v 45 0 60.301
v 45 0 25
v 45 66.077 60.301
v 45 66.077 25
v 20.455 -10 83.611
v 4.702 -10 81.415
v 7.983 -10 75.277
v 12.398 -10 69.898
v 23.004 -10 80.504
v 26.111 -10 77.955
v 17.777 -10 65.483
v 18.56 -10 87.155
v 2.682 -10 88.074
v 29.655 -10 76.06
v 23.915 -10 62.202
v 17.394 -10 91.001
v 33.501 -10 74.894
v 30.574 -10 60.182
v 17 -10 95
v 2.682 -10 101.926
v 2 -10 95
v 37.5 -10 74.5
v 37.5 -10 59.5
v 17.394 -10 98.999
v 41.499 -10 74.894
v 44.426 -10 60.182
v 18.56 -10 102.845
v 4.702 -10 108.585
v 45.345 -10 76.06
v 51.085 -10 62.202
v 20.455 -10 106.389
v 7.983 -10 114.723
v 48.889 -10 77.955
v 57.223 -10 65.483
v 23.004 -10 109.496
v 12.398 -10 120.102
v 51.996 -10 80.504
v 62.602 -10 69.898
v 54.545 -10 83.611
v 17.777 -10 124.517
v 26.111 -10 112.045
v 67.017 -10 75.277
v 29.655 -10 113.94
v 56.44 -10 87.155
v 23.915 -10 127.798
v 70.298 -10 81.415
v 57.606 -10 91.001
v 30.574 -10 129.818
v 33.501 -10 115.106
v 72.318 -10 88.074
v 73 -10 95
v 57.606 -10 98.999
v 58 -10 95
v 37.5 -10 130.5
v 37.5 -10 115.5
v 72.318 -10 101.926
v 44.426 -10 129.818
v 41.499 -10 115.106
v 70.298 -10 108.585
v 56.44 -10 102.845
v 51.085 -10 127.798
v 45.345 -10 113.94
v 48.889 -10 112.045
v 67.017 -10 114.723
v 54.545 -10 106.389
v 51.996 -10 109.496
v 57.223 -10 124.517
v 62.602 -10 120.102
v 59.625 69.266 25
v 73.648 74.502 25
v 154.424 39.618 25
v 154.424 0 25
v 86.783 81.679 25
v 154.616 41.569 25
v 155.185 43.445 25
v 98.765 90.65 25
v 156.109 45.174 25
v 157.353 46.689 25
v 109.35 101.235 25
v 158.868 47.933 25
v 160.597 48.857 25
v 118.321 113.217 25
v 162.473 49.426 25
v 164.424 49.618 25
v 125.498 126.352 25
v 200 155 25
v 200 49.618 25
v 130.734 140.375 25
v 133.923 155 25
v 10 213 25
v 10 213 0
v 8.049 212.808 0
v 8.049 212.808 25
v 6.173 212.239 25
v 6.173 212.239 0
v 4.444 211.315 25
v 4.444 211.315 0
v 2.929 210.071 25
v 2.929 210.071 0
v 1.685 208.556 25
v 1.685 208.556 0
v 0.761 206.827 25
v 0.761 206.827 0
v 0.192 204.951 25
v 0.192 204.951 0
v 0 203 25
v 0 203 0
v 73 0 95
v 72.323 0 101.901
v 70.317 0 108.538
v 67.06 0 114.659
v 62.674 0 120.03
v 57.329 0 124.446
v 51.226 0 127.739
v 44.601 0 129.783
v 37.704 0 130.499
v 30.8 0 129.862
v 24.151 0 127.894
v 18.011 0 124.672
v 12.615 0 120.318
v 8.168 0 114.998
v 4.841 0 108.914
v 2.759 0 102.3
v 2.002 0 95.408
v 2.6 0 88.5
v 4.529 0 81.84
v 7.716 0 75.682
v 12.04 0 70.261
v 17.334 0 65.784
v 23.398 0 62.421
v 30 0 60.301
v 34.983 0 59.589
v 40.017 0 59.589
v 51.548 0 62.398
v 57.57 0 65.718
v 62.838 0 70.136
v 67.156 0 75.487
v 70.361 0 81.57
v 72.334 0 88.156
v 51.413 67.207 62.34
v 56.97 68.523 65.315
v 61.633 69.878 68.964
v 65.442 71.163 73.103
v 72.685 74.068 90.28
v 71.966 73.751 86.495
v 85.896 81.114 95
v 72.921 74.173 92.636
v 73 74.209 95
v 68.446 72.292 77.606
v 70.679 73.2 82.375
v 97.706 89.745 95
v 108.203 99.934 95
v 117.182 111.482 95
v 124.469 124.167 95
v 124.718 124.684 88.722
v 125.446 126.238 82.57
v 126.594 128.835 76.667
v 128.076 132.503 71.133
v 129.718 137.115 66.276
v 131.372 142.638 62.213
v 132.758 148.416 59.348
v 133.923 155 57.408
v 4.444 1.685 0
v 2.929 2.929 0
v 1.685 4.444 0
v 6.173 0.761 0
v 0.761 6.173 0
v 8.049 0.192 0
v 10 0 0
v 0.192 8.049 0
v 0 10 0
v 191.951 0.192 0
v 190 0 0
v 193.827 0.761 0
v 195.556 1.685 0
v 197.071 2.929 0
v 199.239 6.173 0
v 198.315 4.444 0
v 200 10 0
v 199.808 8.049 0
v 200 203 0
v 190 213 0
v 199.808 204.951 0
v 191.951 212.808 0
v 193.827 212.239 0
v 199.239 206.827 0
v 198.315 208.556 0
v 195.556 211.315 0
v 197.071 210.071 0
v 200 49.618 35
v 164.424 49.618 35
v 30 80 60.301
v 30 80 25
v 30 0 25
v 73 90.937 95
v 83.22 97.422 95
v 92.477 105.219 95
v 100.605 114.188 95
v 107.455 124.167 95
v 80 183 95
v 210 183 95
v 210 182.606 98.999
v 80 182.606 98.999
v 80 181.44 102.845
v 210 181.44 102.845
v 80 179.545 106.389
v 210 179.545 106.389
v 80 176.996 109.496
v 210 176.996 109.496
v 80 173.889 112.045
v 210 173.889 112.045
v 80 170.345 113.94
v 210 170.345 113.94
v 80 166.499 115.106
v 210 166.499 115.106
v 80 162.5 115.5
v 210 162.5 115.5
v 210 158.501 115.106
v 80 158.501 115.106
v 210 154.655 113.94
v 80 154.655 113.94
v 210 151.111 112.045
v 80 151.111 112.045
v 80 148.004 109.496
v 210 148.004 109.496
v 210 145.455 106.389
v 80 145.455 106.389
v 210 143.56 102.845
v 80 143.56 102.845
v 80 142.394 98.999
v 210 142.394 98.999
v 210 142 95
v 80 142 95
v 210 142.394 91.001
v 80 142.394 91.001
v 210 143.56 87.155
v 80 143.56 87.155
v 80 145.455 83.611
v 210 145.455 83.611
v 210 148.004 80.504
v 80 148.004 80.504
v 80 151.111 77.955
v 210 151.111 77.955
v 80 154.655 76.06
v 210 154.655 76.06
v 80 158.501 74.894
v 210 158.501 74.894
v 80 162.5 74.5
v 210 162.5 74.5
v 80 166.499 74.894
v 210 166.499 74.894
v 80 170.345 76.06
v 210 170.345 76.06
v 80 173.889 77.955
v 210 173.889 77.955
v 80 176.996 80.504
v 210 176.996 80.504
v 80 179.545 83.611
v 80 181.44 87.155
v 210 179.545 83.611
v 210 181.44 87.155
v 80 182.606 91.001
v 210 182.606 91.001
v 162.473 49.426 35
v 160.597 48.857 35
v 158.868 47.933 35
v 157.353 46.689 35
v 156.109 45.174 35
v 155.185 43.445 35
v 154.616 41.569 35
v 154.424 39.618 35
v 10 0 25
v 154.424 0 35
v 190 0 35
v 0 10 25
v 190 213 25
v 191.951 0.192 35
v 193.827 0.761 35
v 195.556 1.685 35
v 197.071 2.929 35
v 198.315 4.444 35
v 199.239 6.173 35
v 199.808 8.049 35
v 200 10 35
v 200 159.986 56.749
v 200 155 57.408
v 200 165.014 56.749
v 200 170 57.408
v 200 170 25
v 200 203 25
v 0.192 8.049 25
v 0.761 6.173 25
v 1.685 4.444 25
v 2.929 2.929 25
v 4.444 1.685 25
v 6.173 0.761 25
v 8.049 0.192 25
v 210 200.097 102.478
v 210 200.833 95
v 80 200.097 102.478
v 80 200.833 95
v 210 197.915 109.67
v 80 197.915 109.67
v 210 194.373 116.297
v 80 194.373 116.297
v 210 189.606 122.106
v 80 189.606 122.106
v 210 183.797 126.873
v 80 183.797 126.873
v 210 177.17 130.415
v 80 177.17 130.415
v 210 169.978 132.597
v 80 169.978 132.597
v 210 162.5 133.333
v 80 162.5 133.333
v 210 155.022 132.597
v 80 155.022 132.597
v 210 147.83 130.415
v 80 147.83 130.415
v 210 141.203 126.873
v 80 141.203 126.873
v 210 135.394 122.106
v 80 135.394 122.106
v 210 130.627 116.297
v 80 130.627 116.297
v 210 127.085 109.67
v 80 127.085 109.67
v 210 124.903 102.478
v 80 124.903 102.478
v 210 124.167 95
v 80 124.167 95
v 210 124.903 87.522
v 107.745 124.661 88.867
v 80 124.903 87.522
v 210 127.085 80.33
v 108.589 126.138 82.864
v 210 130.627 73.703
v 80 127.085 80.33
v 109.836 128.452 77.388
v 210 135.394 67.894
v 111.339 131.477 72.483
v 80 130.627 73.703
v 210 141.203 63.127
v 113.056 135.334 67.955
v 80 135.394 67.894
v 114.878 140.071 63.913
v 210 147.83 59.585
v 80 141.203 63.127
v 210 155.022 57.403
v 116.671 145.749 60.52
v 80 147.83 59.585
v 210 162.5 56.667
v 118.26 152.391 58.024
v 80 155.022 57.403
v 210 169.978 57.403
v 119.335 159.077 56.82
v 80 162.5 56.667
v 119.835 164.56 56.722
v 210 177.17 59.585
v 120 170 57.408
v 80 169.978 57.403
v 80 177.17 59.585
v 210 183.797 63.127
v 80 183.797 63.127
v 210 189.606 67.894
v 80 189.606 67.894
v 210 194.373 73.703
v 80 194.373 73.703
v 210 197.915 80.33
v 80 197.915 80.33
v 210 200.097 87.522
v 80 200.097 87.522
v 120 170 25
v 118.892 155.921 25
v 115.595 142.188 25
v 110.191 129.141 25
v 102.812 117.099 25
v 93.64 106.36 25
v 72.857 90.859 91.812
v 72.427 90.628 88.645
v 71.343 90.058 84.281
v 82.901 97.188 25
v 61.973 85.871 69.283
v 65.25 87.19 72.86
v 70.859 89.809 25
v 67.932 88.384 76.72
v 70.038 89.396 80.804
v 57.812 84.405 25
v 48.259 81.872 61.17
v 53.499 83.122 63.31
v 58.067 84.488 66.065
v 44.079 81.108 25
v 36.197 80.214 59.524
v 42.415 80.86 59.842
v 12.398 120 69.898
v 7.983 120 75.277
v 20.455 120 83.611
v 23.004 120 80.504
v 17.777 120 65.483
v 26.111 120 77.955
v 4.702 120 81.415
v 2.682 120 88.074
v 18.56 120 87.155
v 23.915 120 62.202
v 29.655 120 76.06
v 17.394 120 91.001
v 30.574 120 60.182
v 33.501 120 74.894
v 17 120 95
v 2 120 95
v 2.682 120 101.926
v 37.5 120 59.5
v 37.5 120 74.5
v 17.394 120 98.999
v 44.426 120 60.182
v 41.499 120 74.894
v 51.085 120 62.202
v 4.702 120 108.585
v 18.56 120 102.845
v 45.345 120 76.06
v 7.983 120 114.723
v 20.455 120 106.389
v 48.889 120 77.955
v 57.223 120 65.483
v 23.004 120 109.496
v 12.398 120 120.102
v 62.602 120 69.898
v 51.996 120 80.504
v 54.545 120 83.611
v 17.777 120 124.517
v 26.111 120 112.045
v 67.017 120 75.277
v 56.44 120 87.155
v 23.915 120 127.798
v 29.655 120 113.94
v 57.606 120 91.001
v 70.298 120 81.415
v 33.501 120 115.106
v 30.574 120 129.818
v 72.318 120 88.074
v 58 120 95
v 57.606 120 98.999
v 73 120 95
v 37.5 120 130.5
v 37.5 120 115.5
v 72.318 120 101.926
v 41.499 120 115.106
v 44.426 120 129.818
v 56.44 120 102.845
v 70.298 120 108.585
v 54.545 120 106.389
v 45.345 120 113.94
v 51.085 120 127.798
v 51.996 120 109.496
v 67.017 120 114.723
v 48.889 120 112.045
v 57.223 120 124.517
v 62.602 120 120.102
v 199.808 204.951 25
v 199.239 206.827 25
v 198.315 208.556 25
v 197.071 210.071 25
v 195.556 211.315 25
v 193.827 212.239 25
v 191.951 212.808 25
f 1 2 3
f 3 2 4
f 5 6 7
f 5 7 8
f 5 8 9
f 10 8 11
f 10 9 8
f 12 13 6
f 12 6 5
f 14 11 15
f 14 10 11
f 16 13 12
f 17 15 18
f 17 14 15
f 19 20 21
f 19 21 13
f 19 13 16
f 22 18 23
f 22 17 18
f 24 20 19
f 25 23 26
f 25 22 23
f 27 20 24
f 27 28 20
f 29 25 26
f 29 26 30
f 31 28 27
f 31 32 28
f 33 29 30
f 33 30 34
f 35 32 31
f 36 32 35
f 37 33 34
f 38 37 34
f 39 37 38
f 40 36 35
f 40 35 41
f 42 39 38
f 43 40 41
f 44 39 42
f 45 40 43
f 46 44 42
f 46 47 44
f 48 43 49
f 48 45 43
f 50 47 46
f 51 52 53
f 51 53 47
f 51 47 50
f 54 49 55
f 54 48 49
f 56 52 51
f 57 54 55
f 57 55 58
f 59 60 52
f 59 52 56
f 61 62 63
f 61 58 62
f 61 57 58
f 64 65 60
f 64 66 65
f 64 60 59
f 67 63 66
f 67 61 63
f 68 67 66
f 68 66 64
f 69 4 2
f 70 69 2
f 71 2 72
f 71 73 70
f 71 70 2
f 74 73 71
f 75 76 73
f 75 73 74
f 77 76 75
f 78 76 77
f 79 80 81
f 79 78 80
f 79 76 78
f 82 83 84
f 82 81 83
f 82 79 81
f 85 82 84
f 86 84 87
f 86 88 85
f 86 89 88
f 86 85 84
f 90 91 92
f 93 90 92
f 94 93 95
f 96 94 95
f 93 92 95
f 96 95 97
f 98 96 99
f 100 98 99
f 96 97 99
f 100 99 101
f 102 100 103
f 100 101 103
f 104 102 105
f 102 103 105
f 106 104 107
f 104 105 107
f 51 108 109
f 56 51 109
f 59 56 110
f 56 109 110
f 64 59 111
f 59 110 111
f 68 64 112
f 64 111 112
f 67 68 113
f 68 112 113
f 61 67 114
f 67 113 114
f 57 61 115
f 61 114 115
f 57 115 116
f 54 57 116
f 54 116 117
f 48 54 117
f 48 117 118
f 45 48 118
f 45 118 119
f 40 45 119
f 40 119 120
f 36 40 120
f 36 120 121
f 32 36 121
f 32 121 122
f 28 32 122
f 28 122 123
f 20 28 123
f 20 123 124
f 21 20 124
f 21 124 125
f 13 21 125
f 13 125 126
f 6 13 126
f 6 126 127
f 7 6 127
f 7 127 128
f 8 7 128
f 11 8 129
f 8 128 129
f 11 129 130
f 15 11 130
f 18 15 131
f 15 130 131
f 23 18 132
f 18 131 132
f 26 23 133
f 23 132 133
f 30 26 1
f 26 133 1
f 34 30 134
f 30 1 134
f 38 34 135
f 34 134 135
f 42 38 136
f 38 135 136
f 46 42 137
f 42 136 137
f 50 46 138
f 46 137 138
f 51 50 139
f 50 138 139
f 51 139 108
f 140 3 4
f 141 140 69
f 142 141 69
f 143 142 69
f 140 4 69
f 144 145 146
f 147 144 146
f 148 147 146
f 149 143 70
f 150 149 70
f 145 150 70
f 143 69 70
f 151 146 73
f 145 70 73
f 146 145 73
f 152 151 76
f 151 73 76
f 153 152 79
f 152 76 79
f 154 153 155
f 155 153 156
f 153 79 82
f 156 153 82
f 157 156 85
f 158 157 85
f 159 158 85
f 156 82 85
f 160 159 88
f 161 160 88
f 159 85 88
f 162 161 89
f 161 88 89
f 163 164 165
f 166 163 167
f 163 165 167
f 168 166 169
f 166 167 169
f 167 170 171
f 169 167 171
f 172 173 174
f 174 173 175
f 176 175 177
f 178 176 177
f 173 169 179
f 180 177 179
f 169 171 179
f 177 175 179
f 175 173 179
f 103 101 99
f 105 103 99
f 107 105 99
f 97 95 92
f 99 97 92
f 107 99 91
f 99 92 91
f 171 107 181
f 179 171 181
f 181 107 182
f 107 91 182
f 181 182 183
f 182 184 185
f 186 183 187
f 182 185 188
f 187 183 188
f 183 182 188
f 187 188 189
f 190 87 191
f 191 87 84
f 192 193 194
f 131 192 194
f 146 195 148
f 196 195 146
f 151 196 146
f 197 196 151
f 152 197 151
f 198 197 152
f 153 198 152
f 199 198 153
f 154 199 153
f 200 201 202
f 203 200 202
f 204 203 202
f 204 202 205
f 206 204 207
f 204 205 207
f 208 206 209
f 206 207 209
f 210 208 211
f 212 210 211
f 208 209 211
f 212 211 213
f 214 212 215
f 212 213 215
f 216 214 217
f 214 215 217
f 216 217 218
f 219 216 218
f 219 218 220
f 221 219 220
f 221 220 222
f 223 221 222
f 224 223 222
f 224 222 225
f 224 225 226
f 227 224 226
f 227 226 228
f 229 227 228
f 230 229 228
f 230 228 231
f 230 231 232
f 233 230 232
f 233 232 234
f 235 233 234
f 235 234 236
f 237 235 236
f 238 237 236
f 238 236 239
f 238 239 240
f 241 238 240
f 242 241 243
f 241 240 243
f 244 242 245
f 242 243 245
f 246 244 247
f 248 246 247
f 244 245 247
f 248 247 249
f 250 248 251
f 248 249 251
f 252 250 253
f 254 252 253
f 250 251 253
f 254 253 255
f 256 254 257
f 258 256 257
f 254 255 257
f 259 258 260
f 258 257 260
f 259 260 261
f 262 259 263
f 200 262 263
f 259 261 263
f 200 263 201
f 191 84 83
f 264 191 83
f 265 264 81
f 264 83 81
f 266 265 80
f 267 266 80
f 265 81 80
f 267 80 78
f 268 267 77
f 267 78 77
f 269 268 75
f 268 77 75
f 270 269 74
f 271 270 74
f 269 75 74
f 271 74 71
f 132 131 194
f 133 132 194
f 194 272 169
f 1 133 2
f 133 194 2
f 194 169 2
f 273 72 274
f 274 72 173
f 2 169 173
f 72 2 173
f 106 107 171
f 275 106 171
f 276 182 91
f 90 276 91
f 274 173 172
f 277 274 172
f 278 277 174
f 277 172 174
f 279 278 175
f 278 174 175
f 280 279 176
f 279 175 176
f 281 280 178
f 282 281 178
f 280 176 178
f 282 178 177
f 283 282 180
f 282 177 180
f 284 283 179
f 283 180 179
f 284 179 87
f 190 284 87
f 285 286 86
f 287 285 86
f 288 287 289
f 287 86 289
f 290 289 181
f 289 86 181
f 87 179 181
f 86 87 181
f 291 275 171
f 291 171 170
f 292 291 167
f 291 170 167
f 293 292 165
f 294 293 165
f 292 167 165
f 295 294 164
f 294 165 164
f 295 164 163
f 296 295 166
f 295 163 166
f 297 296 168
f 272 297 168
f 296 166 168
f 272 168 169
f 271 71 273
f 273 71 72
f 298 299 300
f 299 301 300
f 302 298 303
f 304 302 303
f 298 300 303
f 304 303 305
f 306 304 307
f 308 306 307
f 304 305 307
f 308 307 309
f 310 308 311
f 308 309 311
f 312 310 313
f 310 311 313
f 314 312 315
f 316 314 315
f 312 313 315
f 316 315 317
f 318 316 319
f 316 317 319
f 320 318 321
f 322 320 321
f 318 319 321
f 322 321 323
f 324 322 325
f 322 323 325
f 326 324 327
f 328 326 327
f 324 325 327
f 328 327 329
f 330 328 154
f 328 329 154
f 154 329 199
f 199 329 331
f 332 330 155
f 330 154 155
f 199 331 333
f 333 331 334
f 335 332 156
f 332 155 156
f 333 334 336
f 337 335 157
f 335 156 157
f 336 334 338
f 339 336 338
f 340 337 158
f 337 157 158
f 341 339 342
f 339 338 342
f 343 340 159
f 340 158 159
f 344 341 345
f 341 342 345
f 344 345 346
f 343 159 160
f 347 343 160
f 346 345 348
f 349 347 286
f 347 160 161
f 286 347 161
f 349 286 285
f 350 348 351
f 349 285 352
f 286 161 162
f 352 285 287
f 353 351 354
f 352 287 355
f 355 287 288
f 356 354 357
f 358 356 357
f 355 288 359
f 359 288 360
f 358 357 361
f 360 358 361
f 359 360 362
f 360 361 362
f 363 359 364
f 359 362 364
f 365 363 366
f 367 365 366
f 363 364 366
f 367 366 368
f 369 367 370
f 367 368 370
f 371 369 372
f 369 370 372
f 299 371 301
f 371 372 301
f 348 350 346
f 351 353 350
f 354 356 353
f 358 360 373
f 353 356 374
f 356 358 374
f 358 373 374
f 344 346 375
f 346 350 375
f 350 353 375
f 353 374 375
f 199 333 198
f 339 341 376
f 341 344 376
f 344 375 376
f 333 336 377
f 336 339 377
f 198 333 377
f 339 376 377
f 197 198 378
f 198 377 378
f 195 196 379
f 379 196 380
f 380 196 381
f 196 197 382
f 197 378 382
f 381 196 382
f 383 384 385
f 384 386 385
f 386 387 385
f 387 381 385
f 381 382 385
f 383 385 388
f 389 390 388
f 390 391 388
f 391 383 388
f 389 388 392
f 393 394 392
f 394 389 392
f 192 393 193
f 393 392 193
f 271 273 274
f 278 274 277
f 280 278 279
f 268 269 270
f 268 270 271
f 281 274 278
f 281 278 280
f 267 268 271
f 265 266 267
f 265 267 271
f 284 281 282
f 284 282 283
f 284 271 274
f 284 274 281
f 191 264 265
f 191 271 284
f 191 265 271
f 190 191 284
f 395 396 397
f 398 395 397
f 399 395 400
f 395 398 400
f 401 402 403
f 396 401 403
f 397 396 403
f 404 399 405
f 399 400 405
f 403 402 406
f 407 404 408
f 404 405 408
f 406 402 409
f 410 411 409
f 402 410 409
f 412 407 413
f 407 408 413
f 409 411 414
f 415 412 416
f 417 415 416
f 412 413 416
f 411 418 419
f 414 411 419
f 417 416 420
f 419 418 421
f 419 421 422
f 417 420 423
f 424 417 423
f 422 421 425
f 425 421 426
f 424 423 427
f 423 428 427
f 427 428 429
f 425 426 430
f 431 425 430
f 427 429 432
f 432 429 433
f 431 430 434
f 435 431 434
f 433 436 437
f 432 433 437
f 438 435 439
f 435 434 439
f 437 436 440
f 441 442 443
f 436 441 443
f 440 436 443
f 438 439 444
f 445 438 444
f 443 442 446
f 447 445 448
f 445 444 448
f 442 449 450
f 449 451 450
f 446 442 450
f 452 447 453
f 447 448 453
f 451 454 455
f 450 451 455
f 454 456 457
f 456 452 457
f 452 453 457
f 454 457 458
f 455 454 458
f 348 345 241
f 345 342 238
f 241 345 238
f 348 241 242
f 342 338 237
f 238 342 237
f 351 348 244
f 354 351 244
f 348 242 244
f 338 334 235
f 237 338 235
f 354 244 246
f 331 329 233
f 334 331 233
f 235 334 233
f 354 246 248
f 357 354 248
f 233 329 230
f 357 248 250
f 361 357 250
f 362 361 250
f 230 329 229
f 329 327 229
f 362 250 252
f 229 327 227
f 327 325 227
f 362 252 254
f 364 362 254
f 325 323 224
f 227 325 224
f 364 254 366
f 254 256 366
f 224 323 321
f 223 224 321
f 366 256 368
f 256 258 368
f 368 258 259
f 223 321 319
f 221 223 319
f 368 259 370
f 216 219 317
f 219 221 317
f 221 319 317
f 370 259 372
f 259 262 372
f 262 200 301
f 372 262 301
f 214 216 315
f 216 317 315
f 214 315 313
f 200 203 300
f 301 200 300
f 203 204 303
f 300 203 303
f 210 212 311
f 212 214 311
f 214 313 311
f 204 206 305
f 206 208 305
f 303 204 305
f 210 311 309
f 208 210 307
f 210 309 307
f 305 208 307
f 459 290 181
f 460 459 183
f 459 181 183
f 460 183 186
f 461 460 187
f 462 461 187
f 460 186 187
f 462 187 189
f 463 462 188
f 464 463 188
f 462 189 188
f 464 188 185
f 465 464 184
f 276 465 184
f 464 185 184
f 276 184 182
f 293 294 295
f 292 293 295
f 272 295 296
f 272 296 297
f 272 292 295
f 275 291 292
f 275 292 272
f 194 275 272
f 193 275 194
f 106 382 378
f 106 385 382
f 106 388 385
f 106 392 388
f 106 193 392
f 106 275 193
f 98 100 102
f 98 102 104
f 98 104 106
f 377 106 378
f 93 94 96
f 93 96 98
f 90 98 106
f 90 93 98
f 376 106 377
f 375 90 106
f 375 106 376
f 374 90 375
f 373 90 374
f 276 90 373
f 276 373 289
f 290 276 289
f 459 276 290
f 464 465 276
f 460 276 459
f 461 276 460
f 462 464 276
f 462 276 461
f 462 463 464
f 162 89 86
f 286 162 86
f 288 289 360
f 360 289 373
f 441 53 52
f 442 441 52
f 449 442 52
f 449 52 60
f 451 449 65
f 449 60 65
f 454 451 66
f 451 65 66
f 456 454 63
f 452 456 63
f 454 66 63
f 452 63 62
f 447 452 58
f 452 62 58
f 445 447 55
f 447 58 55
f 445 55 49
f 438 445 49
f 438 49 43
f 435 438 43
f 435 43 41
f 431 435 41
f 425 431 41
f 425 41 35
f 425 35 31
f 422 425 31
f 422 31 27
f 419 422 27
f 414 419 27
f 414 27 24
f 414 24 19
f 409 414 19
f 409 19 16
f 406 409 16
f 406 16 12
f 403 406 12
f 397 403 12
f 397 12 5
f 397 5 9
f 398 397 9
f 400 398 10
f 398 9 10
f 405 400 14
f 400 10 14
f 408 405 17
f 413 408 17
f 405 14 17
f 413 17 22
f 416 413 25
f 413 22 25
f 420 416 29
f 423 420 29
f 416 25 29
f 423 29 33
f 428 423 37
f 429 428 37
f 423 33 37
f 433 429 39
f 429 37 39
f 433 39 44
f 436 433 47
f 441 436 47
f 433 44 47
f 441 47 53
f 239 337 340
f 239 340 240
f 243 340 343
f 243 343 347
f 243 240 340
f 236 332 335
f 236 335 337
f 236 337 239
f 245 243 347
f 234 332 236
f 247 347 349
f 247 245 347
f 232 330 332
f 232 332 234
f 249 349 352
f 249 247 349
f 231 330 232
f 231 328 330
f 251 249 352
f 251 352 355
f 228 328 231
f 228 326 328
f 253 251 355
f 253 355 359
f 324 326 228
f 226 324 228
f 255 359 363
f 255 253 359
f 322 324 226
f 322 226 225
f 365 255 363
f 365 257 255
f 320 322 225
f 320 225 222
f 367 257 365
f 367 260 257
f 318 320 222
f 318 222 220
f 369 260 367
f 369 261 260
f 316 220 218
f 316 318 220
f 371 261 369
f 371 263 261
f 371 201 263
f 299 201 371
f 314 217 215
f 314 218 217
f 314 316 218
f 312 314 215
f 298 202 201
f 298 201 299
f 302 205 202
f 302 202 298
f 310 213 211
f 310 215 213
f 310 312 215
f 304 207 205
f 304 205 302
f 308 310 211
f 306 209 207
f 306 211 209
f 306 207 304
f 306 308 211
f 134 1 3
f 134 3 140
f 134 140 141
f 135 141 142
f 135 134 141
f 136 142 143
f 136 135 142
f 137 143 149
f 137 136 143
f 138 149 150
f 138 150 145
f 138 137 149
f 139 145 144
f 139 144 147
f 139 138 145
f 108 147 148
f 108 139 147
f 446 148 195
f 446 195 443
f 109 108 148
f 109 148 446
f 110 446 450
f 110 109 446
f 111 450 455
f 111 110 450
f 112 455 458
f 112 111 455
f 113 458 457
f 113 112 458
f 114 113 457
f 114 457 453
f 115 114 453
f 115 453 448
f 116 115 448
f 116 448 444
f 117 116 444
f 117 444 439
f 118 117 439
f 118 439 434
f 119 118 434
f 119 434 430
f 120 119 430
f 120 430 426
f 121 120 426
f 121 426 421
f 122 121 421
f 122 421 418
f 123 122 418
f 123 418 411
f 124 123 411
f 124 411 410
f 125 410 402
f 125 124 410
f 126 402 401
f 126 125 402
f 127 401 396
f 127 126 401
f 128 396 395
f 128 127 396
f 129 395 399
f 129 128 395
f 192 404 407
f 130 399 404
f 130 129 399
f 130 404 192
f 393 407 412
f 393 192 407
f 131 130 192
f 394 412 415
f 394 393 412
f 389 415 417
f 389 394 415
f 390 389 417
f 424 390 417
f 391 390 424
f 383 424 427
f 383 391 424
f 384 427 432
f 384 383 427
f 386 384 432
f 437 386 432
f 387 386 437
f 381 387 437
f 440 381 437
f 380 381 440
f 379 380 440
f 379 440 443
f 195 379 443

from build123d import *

# Parameters (mm, degrees)
F2_DEPTH      = 25
F4_DEPTH      = 70
F5_R          = 35.5
F6_DEPTH      = 10
F6_DEPTH_BACK = 120
F7_R          = 38.3333333333
F8_DEPTH      = 10
F8_DEPTH_BACK = 120
F9_R          = 20.5
F10_DEPTH     = 223.001
F11_R         = 20.5
F12_DEPTH     = 210.001
F14_DEPTH     = 10


with BuildPart() as f2:
    # F1 (on Top) → F2 (new body)
    with BuildSketch(Plane.XY):
        with BuildLine():
            ThreePointArc((0, 10), (2.9289321881, 2.9289321881), (10, 0))
            Line((10, 0), (190, 0))
            ThreePointArc((190, 0), (197.0710678119, 2.9289321881), (200, 10))
            Line((200, 10), (200, 203))
            ThreePointArc((200, 203), (197.0710678119, 210.0710678119), (190, 213))
            Line((190, 213), (10, 213))
            ThreePointArc((10, 213), (2.9289321881, 210.0710678119), (0, 203))
            Line((0, 203), (0, 10))
        make_face()
    extrude(amount=F2_DEPTH)

    # F3 (on face) → F4 (join)
    with BuildSketch(Plane.XY.offset(25)):
        with BuildLine():
            Line((30, 80), (30, 0))
            Line((30, 0), (45, 0))
            Line((45, 0), (45, 66.0769515459))
            ThreePointArc((45, 66.0769515459), (104.2462120246, 95.7537879754), (133.9230484541, 155))
            Line((133.9230484541, 155), (200, 155))
            Line((200, 155), (200, 170))
            Line((200, 170), (120, 170))
            ThreePointArc((120, 170), (93.6396103068, 106.3603896932), (30, 80))
        make_face()
    extrude(amount=F4_DEPTH)

    # F5 (on face) → F6 (join, two sides)
    with BuildSketch(Plane.XZ) as f6_sk:
        with Locations((37.5, 95)):
            Circle(F5_R)
    extrude(amount=F6_DEPTH)
    extrude(f6_sk.sketch, amount=-F6_DEPTH_BACK)

    # F7 (on face) → F8 (join, two sides)
    with BuildSketch(Plane.YZ.offset(200)) as f8_sk:
        with Locations((162.5, 95)):
            Circle(F7_R)
    extrude(amount=F8_DEPTH)
    extrude(f8_sk.sketch, amount=-F8_DEPTH_BACK)

    # F9 (on face) → F10 (cut, through all)
    with BuildSketch(Plane.XZ.offset(10)):
        with Locations((37.5, 95)):
            Circle(F9_R)
    extrude(amount=-F10_DEPTH, mode=Mode.SUBTRACT)

    # F11 (on face) → F12 (cut, through all)
    with BuildSketch(Plane.YZ.offset(210)):
        with Locations((162.5, 95)):
            Circle(F11_R)
    extrude(amount=-F12_DEPTH, mode=Mode.SUBTRACT)

    # F13 (on face) → F14 (join)
    with BuildSketch(Plane.XY.offset(25)):
        with BuildLine():
            Line((200, 10), (200, 49.6179956198))
            Line((200, 49.6179956198), (164.4239968061, 49.6179956198))
            ThreePointArc((164.4239968061, 49.6179956198), (157.3529289943, 46.6890634316), (154.4239968061, 39.6179956198))
            Line((154.4239968061, 39.6179956198), (154.4239968061, 0))
            Line((154.4239968061, 0), (190, 0))
            ThreePointArc((190, 0), (197.0710678119, 2.9289321881), (200, 10))
        make_face()
    extrude(amount=F14_DEPTH)


solid = f2.part
